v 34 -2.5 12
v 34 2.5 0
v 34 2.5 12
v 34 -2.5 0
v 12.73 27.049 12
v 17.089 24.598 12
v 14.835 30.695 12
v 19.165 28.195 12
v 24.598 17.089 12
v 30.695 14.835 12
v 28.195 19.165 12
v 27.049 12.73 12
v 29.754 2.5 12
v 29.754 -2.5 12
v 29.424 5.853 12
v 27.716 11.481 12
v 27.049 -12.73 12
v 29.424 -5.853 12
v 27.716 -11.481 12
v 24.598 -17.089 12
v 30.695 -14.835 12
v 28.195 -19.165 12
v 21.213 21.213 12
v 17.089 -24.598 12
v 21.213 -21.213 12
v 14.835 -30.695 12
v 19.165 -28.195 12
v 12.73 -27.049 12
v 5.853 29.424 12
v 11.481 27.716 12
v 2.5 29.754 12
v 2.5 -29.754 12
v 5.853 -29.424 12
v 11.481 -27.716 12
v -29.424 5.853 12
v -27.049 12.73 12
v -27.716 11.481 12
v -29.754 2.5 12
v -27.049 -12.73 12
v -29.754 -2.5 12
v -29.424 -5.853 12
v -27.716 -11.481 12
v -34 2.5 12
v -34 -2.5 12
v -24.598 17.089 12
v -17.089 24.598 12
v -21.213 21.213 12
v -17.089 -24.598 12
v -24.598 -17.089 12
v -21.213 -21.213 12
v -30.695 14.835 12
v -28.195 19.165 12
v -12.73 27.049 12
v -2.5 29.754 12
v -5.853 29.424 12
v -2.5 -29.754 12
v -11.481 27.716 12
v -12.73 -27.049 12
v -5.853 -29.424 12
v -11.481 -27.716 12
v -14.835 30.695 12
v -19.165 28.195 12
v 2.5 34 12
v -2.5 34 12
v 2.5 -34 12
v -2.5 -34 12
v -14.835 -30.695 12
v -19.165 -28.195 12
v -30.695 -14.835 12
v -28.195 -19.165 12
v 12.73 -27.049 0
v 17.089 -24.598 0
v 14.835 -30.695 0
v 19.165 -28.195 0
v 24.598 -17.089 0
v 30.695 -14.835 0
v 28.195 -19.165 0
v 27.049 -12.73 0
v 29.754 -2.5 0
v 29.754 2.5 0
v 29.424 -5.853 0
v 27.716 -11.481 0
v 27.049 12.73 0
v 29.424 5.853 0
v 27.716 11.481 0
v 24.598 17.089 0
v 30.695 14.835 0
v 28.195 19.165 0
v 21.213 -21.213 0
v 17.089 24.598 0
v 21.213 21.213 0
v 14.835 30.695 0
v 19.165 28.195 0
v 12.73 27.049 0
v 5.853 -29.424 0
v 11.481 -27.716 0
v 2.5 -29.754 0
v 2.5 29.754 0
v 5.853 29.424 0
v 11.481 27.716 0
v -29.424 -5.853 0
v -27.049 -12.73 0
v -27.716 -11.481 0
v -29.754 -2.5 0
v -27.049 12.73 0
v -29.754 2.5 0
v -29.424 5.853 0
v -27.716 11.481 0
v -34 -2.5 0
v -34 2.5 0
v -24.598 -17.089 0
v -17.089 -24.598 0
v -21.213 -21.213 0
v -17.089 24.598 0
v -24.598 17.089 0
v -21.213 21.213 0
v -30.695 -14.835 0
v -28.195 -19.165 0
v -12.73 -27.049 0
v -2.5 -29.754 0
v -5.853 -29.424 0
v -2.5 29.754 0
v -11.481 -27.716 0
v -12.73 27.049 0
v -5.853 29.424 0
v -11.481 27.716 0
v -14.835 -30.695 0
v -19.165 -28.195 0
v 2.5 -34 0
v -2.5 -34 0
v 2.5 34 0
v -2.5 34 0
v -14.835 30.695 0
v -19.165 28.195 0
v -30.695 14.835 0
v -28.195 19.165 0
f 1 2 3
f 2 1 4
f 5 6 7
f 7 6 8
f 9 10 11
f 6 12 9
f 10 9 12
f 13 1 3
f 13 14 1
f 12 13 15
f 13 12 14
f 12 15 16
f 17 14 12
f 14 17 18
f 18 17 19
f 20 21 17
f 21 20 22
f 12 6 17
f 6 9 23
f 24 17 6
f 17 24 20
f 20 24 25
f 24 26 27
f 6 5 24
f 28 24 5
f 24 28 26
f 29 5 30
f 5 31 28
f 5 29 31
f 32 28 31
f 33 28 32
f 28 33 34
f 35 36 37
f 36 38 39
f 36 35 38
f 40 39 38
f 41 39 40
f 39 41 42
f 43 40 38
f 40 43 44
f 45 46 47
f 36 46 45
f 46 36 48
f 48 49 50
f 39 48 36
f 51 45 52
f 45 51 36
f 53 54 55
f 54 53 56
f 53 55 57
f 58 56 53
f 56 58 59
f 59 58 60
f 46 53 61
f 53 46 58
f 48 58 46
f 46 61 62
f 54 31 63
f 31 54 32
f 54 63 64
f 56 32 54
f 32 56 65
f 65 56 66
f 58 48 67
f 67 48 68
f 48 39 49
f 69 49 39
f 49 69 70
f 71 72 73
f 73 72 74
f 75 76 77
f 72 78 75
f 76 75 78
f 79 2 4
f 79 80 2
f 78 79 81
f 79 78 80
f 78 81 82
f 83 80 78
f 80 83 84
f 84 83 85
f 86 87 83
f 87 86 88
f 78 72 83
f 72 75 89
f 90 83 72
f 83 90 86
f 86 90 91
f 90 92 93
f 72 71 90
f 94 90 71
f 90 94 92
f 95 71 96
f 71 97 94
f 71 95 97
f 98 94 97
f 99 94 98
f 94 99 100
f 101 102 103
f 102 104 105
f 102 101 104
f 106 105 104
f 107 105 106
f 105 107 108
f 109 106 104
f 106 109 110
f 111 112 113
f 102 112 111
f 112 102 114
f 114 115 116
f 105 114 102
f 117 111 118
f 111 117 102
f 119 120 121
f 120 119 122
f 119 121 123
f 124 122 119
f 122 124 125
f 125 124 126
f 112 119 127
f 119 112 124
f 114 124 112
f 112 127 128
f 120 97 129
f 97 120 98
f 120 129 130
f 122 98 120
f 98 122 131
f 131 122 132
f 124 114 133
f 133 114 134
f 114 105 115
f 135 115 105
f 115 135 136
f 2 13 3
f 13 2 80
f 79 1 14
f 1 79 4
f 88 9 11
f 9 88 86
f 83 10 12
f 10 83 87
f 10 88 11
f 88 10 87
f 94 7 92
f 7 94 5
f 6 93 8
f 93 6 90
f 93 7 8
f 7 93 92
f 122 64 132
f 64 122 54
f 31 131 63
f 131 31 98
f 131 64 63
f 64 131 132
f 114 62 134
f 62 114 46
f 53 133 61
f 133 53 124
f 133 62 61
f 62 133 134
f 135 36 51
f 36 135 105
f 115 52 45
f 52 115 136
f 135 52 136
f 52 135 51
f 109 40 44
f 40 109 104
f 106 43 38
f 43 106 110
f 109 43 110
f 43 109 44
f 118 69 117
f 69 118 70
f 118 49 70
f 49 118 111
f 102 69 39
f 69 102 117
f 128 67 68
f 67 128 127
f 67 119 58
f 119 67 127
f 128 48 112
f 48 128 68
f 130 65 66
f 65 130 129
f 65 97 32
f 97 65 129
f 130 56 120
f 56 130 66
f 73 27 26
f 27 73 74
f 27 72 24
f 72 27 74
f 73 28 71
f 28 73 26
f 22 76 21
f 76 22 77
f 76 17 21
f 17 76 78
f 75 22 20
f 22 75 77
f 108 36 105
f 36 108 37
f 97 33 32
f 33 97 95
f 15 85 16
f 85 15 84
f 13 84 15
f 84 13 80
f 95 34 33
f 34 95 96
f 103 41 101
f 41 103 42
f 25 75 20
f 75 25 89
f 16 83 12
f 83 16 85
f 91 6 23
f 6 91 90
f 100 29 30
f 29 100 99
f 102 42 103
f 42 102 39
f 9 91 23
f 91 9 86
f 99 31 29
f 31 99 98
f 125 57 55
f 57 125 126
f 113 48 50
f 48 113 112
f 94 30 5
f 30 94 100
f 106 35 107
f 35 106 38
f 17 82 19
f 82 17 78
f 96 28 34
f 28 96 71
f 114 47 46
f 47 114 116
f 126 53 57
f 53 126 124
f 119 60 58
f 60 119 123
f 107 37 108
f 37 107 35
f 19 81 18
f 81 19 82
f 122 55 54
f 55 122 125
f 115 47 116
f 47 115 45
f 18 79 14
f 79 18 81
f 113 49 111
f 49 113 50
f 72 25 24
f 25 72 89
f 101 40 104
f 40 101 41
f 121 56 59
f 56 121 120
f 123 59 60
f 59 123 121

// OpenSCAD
$fn = 32;

// ----------------------------------------------------------------------
// Spur blank: plain gear blank
// ----------------------------------------------------------------------

// --- parameters (mm) ---
disc_r = 30;              // blank root radius
disc_t = 12;              // blank thickness
n_teeth = 12;             // stub tooth count
tooth_w = 5;              // tooth width at the root
tooth_h = 4;              // tooth height above the root
fit_tol = 0.05;           // tolerance for press fits, mm
free_tol = 0.2;           // tolerance for clearance fits, mm

out_r = disc_r + tooth_h;  // tip radius
bbox_x = 68.0;  // measured width over the teeth
bbox_y = 68.0;  // measured depth over the teeth

union() {
  cylinder(r = disc_r, h = disc_t);
  for (i = [0 : n_teeth - 1])
    rotate([0, 0, i * 360 / n_teeth])
      translate([disc_r - 1, -tooth_w / 2, 0])
        cube([tooth_h + 1, tooth_w, disc_t]);
}
